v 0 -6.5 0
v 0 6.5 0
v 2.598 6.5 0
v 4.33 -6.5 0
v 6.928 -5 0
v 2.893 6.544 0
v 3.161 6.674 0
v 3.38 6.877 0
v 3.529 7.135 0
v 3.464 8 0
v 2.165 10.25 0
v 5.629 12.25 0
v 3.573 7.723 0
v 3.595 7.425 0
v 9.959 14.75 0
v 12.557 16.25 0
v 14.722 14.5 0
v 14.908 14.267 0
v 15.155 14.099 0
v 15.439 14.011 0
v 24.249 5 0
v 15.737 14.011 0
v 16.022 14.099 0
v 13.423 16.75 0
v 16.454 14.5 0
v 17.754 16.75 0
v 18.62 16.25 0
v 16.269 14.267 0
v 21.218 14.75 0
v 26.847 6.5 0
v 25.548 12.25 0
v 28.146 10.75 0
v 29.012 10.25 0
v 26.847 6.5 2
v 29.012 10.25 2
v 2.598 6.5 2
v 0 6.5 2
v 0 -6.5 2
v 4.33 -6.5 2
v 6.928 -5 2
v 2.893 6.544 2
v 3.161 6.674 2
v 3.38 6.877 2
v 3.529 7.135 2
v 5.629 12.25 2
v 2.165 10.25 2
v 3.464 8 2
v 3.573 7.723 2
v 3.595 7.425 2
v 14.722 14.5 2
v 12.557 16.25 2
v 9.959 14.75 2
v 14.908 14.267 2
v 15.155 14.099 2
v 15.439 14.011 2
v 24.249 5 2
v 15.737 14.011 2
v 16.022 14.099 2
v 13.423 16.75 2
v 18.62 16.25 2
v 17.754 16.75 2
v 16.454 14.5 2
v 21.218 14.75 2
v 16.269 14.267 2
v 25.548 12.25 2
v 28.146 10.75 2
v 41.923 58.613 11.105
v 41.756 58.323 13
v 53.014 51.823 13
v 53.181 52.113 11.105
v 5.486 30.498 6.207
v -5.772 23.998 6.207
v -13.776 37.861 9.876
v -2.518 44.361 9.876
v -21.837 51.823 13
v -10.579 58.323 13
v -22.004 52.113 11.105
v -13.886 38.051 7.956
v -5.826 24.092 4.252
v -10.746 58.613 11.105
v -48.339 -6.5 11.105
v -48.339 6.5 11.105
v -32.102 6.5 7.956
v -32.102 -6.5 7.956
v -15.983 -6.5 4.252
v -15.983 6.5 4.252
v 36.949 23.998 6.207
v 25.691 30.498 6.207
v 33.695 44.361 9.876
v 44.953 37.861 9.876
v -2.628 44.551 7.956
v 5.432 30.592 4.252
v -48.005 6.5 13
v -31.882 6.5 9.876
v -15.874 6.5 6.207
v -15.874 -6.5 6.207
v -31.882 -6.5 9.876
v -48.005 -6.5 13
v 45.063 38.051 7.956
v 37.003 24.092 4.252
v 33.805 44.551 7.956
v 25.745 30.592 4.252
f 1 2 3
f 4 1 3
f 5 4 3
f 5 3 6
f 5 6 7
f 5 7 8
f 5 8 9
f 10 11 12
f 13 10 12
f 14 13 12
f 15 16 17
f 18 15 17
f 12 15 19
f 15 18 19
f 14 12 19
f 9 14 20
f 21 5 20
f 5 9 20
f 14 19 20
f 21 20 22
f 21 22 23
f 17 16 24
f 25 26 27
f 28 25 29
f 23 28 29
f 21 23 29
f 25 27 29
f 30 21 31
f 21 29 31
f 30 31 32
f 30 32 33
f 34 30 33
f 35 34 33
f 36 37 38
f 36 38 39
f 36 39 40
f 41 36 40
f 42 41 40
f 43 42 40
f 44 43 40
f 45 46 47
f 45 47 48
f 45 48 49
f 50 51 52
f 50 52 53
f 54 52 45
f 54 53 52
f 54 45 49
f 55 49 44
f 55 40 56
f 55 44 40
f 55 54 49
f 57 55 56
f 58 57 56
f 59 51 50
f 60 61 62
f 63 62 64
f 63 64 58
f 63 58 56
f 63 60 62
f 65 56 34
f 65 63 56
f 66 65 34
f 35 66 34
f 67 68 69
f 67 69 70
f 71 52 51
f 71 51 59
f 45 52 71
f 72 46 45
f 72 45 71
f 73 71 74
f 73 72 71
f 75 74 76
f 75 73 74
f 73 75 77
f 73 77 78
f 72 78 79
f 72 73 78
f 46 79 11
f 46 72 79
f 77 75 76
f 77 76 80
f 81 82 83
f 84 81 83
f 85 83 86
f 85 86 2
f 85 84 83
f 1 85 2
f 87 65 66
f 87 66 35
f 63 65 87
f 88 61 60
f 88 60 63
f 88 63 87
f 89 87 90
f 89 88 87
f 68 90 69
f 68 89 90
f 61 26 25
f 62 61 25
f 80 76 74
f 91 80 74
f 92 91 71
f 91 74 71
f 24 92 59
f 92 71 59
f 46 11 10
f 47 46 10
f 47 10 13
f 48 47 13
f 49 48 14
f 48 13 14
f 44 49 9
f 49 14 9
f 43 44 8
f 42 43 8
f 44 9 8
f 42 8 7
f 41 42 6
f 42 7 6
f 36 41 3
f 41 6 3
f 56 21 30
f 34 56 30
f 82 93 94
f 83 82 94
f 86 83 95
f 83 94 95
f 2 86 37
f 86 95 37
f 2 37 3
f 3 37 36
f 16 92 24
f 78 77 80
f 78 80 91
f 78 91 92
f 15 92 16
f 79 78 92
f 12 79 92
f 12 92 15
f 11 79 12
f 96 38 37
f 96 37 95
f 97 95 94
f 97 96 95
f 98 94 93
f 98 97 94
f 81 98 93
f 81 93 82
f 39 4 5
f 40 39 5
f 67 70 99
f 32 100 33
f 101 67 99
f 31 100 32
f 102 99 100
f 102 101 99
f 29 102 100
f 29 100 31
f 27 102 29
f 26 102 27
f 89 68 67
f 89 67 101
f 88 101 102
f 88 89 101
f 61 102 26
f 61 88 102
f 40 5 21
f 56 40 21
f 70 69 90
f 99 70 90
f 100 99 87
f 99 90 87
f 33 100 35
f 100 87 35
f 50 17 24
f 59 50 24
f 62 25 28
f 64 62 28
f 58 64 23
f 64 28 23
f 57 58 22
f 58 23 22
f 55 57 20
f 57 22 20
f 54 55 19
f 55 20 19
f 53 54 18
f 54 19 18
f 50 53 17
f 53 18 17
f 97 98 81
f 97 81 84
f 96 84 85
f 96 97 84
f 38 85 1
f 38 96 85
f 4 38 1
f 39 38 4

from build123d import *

# Parameters (mm, degrees)
AUFSATZ_LINEAR_AUSTRAGEN1_DEPTH = 2
AUFSATZ_LINEAR_AUSTRAGEN5_DEPTH = 13
KREISMUSTER3_COUNT              = 3
KREISMUSTER3_ANGLE              = 120


with BuildPart() as part:
    # Skizze1 → Aufsatz-Linear austragen1 (new body)
    with BuildSketch(Plane.XY):
        with BuildLine():
            Line((29.011851027, 10.25), (28.145825623, 10.75))
            Line((28.145825623, 10.75), (25.547749412, 12.25))
            Line((25.547749412, 12.25), (21.217622393, 14.75))
            Line((21.217622393, 14.75), (18.619546181, 16.25))
            Line((18.619546181, 16.25), (17.753520778, 16.75))
            Line((17.753520778, 16.75), (16.454482672, 14.5))
            ThreePointArc((16.454482672, 14.5), (15.588457268, 14), (14.722431864, 14.5))
            Line((14.722431864, 14.5), (13.423393759, 16.75))
            Line((13.423393759, 16.75), (12.557368355, 16.25))
            Line((12.557368355, 16.25), (9.959292144, 14.75))
            Line((9.959292144, 14.75), (5.629165125, 12.25))
            Line((5.629165125, 12.25), (3.031088913, 10.75))
            Line((3.031088913, 10.75), (2.165063509, 10.25))
            Line((2.165063509, 10.25), (3.464101615, 8))
            ThreePointArc((3.464101615, 8), (3.464101615, 7), (2.598076211, 6.5))
            Line((2.598076211, 6.5), (0, 6.5))
            Line((0, 6.5), (0, 5.5))
            Line((0, 5.5), (0, 2.5))
            Line((0, 2.5), (0, -2.5))
            Line((0, -2.5), (0, -5.5))
            Line((0, -5.5), (0, -6.5))
            Line((0, -6.5), (4.330127019, -6.5))
            Line((4.330127019, -6.5), (6.92820323, -5))
            Line((6.92820323, -5), (24.248711306, 5))
            Line((24.248711306, 5), (26.846787517, 6.5))
            Line((26.846787517, 6.5), (29.011851027, 10.25))
        make_face()
    extrude(amount=AUFSATZ_LINEAR_AUSTRAGEN1_DEPTH)

    # Skizze6 → Aufsatz-Linear austragen5 (add)
    with BuildSketch(Plane.XZ.offset(6.5)):
        with BuildLine():
            Line((-48.004683363, 13), (-48.338732237, 11.105224302))
            ThreePointArc((-48.338732237, 11.105224302), (-24.026875813, 6.172842822), (0, 0))
            Line((0, 0), (0, 2))
            ThreePointArc((0, 2), (-23.862752465, 8.109176013), (-48.004683363, 13))
        make_face()
    aufsatz_linear_austragen5 = extrude(amount=-AUFSATZ_LINEAR_AUSTRAGEN5_DEPTH)

    # Kreismuster3: Aufsatz-Linear austragen5 ×3 about axis
    kreismuster3_axis = Axis((15.588457268, 0, 0), (0, 0, -1))
    for i in range(1, KREISMUSTER3_COUNT):
        add(aufsatz_linear_austragen5.rotate(kreismuster3_axis, i * KREISMUSTER3_ANGLE / (KREISMUSTER3_COUNT - 1)))


solid = part.part
